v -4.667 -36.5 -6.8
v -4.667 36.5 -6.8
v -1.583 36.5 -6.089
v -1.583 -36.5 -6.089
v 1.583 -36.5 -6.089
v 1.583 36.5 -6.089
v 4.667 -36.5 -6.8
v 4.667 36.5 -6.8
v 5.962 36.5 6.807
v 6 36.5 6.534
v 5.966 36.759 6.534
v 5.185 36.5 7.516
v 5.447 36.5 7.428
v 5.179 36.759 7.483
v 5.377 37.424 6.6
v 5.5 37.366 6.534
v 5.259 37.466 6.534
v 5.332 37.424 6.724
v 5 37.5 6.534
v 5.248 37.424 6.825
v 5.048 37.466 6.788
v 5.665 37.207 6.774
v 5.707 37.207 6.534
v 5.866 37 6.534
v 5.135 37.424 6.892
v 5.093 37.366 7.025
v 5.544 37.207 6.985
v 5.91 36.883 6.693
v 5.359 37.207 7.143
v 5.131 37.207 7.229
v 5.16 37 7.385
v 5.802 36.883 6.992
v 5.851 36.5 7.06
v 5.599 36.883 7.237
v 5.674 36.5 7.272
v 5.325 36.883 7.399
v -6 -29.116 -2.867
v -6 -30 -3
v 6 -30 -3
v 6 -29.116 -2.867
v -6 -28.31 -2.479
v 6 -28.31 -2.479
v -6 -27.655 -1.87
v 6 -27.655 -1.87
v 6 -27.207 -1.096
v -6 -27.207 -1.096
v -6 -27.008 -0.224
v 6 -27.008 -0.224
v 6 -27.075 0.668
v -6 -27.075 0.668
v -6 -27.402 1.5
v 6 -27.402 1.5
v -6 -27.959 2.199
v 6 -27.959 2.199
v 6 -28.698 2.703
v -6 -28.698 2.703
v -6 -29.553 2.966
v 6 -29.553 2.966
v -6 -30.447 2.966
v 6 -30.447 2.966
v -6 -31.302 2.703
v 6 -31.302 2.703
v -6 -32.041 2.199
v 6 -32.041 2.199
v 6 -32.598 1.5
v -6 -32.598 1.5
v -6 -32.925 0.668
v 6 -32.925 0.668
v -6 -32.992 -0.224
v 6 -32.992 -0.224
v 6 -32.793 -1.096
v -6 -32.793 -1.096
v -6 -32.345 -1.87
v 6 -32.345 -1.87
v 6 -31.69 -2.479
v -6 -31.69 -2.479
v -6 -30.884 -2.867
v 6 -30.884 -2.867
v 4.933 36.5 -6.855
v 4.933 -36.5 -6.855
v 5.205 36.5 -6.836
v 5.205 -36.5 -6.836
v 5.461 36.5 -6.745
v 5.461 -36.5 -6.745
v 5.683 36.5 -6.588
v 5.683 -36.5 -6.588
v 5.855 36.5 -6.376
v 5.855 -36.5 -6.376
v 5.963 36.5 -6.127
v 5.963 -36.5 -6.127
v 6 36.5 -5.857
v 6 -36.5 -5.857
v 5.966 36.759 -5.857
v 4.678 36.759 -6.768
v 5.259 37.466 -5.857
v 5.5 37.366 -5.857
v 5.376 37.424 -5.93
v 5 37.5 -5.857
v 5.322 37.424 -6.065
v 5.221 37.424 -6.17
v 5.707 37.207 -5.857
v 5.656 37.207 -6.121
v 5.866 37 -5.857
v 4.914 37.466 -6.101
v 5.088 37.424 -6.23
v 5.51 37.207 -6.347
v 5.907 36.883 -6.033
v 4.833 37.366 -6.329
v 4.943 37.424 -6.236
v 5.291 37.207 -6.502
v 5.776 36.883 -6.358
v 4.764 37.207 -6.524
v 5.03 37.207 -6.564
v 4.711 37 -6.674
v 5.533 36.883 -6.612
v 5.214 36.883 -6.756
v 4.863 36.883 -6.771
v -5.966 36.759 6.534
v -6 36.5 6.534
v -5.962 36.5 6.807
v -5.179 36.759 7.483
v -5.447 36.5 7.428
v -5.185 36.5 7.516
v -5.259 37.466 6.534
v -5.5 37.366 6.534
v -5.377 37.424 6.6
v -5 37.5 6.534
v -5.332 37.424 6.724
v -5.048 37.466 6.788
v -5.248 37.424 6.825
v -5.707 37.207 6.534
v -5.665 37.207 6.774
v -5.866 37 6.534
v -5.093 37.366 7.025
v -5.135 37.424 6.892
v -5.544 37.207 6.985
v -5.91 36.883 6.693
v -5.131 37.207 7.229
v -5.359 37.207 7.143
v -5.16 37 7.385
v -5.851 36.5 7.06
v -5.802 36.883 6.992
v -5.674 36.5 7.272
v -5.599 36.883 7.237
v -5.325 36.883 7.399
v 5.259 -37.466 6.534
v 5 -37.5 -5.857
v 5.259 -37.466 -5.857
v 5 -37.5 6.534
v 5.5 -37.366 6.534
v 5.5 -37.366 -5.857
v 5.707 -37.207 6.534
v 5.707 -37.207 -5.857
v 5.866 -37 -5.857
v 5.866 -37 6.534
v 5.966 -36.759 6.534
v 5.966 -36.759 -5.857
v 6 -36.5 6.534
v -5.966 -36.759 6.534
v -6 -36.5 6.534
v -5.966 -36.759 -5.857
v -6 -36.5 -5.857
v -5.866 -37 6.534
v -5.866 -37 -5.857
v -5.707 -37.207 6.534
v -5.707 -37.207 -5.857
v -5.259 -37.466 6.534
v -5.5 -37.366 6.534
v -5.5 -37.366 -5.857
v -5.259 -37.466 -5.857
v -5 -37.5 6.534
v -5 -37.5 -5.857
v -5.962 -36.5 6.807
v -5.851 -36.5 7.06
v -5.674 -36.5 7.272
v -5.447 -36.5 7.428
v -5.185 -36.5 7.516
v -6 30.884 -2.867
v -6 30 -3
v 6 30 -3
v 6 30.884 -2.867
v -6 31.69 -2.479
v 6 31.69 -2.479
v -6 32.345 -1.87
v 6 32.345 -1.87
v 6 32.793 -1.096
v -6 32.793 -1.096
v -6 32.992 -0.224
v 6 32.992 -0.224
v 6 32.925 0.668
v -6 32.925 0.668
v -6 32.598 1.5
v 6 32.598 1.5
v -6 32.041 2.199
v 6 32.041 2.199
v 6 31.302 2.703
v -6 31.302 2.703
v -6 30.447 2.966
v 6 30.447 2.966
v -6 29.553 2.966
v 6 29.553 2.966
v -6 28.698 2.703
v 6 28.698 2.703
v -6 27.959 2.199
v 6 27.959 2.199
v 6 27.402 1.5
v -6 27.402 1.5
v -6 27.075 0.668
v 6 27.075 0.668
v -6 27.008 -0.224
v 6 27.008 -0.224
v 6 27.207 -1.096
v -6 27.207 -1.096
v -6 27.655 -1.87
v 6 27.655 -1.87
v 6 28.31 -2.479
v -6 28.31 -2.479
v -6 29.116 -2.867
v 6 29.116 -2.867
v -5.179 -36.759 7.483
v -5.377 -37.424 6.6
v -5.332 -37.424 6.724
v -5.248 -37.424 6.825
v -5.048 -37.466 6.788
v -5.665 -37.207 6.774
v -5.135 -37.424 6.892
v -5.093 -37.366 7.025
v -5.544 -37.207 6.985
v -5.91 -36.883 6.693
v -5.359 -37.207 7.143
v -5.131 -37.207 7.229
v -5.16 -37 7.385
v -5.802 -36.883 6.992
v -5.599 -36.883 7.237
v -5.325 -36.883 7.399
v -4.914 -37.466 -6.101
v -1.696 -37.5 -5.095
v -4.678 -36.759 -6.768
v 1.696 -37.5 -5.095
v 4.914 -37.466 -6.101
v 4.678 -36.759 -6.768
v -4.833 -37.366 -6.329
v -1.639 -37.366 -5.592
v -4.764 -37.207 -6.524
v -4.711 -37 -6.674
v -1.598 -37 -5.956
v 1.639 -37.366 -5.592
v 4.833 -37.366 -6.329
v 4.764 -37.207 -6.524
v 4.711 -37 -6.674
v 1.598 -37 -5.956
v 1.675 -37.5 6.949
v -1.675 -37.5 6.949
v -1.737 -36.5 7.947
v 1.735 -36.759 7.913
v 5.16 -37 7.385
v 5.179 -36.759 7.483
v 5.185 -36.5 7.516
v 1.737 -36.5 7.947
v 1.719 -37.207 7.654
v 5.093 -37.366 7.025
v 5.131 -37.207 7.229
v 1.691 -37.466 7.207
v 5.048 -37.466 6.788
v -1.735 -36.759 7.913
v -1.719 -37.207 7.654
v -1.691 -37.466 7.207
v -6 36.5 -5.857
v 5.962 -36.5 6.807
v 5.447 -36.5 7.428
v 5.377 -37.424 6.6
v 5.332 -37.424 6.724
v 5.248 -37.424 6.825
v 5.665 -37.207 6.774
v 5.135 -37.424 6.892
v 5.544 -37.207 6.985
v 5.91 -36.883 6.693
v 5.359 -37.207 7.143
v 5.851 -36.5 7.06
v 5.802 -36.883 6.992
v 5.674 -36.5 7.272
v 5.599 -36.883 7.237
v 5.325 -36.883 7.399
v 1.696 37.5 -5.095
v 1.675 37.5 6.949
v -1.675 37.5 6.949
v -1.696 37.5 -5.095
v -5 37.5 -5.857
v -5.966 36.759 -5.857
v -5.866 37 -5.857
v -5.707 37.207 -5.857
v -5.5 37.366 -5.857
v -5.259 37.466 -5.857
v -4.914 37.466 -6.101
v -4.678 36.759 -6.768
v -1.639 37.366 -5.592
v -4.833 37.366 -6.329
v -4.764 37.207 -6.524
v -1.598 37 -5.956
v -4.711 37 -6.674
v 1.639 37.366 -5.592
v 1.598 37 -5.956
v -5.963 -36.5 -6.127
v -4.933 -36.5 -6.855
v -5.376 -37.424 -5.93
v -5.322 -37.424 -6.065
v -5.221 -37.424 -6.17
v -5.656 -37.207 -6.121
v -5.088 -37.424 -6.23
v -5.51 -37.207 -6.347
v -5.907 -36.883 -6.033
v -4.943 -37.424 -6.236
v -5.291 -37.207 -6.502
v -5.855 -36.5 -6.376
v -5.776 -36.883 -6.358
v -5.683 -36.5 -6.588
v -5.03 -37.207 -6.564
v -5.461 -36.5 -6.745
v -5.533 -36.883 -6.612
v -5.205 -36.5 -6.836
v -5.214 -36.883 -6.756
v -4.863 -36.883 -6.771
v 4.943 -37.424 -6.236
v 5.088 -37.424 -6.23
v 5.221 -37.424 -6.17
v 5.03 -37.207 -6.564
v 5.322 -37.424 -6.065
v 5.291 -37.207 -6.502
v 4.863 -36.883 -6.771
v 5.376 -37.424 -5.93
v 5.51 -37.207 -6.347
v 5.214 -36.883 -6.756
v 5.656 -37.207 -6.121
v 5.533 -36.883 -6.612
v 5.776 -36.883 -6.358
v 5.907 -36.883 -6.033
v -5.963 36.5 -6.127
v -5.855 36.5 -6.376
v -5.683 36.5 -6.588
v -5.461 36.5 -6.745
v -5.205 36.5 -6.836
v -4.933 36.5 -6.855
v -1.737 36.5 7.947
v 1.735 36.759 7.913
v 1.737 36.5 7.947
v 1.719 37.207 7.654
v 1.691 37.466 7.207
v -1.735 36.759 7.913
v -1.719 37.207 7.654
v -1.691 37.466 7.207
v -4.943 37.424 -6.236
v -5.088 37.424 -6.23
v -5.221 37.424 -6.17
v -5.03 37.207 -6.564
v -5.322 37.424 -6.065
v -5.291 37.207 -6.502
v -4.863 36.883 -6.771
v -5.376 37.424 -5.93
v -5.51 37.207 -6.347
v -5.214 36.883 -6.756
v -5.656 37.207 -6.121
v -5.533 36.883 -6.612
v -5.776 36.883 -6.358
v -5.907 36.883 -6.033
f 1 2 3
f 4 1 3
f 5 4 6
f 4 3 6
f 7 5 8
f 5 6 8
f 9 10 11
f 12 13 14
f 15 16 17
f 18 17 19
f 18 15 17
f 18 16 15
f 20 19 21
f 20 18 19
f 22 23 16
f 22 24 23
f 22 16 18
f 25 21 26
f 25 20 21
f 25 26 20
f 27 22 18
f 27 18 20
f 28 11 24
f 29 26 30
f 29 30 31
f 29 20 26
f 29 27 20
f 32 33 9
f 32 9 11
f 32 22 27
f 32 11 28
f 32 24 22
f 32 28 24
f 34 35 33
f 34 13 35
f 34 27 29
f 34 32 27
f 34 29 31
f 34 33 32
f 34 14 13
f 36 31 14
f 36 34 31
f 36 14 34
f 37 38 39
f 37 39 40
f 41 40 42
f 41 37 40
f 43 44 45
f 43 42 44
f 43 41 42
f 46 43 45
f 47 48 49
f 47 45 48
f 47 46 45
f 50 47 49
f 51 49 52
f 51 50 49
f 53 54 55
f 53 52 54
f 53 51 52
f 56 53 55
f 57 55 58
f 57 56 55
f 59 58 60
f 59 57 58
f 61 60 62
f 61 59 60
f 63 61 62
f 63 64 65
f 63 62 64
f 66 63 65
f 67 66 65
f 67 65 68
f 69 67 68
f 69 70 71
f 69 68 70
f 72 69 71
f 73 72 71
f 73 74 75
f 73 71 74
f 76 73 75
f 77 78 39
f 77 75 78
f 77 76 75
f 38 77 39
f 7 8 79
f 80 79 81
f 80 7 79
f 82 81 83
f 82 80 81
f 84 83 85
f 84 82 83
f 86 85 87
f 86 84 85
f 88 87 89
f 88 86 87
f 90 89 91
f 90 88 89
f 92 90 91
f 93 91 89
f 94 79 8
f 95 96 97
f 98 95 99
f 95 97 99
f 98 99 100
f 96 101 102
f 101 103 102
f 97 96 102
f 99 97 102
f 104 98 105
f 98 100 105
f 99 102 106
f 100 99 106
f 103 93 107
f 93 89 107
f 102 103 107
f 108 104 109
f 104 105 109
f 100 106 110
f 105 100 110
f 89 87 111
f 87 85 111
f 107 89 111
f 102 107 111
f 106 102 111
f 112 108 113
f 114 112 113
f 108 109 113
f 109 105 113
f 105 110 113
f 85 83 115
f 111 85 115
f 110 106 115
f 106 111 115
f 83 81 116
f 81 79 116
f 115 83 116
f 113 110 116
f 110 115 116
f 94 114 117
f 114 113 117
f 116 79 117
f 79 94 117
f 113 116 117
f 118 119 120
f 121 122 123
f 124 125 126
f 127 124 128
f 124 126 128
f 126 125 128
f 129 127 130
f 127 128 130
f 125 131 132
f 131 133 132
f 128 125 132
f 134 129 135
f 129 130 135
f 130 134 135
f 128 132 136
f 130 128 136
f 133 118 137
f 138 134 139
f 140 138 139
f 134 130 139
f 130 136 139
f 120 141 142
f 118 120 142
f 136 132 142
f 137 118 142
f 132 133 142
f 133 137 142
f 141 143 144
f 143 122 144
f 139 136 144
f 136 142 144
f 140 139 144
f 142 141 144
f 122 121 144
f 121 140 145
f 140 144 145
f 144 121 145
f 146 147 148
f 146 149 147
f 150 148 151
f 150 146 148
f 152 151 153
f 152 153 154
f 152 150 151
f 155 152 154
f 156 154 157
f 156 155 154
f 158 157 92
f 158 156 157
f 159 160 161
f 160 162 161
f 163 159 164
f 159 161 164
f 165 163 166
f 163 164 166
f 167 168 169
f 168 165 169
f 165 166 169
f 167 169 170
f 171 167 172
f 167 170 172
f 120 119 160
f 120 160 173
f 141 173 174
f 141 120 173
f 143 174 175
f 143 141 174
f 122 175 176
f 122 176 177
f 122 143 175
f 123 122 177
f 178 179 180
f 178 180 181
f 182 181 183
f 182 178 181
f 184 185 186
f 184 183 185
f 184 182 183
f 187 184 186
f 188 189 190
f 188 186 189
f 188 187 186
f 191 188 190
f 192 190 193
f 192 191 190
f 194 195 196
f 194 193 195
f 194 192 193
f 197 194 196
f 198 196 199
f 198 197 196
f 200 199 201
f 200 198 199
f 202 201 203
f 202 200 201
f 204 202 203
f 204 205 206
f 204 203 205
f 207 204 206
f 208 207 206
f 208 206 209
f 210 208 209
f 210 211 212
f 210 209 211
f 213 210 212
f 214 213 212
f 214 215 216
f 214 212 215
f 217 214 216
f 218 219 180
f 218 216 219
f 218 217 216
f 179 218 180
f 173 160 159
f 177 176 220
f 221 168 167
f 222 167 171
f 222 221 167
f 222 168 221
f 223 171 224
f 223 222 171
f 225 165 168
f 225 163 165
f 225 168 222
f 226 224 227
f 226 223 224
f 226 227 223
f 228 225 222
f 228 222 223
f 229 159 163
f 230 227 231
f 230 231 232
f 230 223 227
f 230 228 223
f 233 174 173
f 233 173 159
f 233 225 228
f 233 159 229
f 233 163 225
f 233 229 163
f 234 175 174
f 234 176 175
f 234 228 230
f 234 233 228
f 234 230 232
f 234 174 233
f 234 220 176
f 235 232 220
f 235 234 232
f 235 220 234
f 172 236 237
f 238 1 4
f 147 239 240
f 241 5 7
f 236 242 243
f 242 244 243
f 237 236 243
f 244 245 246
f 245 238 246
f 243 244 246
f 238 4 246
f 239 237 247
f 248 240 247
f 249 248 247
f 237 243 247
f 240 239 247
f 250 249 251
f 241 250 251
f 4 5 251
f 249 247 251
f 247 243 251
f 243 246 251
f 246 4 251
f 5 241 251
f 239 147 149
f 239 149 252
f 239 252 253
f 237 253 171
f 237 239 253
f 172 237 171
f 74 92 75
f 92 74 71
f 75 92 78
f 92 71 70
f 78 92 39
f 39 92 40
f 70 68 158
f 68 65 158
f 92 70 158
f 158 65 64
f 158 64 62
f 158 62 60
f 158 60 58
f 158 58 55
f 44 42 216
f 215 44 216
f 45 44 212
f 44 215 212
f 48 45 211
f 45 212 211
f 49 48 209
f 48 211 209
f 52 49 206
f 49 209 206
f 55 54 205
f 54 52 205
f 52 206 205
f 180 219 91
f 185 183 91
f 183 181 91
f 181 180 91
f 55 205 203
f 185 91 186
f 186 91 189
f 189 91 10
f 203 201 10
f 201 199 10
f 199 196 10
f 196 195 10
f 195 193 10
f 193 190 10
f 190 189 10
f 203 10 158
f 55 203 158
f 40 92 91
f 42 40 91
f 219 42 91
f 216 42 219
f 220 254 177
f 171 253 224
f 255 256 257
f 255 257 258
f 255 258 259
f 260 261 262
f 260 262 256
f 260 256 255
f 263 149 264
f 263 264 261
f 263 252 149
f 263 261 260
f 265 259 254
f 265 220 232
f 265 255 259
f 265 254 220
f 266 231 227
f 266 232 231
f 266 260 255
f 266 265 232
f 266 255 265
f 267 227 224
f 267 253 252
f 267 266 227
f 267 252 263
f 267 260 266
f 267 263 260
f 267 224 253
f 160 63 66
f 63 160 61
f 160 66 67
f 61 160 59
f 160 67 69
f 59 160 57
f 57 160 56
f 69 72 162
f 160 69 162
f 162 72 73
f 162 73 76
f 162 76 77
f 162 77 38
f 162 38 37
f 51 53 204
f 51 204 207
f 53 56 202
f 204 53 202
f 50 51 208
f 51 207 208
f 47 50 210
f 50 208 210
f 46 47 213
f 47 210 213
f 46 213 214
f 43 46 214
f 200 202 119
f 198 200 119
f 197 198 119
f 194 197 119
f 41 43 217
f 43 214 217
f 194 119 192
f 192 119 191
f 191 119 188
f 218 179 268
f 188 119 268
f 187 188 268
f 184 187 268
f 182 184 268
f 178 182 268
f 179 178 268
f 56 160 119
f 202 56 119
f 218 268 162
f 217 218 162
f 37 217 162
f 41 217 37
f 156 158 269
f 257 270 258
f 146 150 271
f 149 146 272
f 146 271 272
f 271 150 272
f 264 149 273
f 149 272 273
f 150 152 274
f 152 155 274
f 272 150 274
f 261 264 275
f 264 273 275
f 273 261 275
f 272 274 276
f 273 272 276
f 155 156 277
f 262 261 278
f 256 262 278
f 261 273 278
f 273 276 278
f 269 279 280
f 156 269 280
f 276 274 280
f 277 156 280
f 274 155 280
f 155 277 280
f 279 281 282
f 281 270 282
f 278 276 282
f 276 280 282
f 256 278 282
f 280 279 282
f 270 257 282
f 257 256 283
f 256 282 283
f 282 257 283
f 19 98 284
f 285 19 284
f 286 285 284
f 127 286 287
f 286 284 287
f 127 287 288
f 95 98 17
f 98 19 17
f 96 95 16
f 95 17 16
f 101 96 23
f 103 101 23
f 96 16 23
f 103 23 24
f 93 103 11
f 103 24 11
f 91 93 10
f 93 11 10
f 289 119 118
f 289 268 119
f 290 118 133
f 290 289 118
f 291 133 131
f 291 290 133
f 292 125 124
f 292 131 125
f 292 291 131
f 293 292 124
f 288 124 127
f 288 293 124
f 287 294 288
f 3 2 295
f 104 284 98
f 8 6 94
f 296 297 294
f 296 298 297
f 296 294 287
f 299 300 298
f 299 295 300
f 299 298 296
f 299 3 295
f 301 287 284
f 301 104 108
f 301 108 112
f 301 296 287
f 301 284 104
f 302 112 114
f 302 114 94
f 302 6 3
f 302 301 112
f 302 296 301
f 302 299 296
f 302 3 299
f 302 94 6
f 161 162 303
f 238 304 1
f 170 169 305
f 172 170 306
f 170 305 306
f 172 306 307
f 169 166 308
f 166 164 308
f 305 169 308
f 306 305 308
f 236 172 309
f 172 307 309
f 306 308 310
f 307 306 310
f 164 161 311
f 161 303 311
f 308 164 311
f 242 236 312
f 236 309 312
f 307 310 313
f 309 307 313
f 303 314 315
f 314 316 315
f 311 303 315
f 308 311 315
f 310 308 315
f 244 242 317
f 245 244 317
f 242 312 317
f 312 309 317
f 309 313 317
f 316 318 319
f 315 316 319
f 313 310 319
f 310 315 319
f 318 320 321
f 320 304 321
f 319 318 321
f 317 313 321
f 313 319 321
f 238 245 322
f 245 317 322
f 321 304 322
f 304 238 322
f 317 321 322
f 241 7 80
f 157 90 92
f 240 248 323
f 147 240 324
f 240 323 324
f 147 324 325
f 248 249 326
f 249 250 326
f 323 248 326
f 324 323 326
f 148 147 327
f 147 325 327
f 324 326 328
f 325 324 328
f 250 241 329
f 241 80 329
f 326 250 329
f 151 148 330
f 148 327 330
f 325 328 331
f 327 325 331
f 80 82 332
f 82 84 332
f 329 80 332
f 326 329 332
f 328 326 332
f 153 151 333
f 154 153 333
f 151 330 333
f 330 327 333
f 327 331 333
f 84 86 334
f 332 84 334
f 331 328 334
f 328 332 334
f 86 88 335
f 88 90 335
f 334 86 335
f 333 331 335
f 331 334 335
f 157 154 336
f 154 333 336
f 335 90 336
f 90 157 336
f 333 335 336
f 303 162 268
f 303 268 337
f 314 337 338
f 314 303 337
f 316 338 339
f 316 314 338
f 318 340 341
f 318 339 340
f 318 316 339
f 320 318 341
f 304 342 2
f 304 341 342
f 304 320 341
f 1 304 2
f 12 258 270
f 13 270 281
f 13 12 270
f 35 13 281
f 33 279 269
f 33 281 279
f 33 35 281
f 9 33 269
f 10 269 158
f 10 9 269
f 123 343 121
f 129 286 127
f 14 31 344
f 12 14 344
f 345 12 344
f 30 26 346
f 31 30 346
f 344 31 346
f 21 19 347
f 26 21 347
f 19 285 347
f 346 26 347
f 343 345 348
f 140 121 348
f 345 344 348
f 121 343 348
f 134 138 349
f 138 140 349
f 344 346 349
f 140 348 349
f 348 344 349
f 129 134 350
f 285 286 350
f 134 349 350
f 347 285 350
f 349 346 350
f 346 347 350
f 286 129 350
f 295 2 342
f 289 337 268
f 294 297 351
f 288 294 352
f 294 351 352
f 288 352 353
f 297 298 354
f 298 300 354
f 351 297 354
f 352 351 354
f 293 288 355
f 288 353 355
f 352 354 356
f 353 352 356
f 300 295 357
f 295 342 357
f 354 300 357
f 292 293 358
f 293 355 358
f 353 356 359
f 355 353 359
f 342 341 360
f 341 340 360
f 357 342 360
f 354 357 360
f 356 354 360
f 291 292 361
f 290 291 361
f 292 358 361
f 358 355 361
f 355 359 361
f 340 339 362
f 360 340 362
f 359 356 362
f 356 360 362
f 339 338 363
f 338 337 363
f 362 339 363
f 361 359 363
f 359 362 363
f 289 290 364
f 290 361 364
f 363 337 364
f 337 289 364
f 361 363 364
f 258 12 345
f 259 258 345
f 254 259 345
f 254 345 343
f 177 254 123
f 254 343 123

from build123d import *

# Parameters (mm, degrees)
EXTRUDE_1_DEPTH          = 37.5
CUT_EXTRUDE_1_DEPTH      = 39.810570802
CUT_EXTRUDE_1_DEPTH_BACK = 39.810570802
SKETCH_2_R               = 3
FILLET_2_R               = 1


with BuildPart() as part:
    # 草图1 → 凸台-拉伸1 (new, symmetric)
    with BuildSketch(Plane(origin=(0, 0, 0), x_dir=(1, 0, 0), z_dir=(0, 1, 0))):
        with BuildLine():
            Line((-6, -7.350239011), (-6, 7.350239011))
            ThreePointArc((-6, 7.350239011), (0, 5.999349652), (6, 7.350239011))
            Line((6, 7.350239011), (6, -7.350239011))
            ThreePointArc((6, -7.350239011), (0, -8.000650348), (-6, -7.350239011))
        make_face()
    extrude(amount=EXTRUDE_1_DEPTH, both=True)

    # 草图2 → 切除-拉伸1 (cut, two sides: drawn at the far end of the back side and taken through both)
    with BuildSketch(Plane(origin=(0, 0, 0), x_dir=(0, 0, -1), z_dir=(1, 0, 0)).offset(-CUT_EXTRUDE_1_DEPTH_BACK)):
        with Locations((0, 30)):
            Circle(SKETCH_2_R)
        with Locations((0, -30)):
            Circle(SKETCH_2_R)
    extrude(amount=CUT_EXTRUDE_1_DEPTH + CUT_EXTRUDE_1_DEPTH_BACK, mode=Mode.SUBTRACT)

    # 圆角2
    fillet_2_edges = [part.edges().sort_by_distance(p)[0] for p in [
        (0, 37.5, -5.999349652),
        (-6, 37.5, 0),
        (0, 37.5, 8.000650348),
        (-6, -37.5, 0),
        (0, -37.5, -5.999349652),
        (6, -37.5, 0),
        (0, -37.5, 8.000650348),
        (-6, 0, 7.350239011),
        (-6, 0, -7.350239011),
        (6, 0, -7.350239011),
        (6, 0, 7.350239011),
        (6, 37.5, 0),
    ]]
    fillet(fillet_2_edges, radius=FILLET_2_R)


solid = part.part
